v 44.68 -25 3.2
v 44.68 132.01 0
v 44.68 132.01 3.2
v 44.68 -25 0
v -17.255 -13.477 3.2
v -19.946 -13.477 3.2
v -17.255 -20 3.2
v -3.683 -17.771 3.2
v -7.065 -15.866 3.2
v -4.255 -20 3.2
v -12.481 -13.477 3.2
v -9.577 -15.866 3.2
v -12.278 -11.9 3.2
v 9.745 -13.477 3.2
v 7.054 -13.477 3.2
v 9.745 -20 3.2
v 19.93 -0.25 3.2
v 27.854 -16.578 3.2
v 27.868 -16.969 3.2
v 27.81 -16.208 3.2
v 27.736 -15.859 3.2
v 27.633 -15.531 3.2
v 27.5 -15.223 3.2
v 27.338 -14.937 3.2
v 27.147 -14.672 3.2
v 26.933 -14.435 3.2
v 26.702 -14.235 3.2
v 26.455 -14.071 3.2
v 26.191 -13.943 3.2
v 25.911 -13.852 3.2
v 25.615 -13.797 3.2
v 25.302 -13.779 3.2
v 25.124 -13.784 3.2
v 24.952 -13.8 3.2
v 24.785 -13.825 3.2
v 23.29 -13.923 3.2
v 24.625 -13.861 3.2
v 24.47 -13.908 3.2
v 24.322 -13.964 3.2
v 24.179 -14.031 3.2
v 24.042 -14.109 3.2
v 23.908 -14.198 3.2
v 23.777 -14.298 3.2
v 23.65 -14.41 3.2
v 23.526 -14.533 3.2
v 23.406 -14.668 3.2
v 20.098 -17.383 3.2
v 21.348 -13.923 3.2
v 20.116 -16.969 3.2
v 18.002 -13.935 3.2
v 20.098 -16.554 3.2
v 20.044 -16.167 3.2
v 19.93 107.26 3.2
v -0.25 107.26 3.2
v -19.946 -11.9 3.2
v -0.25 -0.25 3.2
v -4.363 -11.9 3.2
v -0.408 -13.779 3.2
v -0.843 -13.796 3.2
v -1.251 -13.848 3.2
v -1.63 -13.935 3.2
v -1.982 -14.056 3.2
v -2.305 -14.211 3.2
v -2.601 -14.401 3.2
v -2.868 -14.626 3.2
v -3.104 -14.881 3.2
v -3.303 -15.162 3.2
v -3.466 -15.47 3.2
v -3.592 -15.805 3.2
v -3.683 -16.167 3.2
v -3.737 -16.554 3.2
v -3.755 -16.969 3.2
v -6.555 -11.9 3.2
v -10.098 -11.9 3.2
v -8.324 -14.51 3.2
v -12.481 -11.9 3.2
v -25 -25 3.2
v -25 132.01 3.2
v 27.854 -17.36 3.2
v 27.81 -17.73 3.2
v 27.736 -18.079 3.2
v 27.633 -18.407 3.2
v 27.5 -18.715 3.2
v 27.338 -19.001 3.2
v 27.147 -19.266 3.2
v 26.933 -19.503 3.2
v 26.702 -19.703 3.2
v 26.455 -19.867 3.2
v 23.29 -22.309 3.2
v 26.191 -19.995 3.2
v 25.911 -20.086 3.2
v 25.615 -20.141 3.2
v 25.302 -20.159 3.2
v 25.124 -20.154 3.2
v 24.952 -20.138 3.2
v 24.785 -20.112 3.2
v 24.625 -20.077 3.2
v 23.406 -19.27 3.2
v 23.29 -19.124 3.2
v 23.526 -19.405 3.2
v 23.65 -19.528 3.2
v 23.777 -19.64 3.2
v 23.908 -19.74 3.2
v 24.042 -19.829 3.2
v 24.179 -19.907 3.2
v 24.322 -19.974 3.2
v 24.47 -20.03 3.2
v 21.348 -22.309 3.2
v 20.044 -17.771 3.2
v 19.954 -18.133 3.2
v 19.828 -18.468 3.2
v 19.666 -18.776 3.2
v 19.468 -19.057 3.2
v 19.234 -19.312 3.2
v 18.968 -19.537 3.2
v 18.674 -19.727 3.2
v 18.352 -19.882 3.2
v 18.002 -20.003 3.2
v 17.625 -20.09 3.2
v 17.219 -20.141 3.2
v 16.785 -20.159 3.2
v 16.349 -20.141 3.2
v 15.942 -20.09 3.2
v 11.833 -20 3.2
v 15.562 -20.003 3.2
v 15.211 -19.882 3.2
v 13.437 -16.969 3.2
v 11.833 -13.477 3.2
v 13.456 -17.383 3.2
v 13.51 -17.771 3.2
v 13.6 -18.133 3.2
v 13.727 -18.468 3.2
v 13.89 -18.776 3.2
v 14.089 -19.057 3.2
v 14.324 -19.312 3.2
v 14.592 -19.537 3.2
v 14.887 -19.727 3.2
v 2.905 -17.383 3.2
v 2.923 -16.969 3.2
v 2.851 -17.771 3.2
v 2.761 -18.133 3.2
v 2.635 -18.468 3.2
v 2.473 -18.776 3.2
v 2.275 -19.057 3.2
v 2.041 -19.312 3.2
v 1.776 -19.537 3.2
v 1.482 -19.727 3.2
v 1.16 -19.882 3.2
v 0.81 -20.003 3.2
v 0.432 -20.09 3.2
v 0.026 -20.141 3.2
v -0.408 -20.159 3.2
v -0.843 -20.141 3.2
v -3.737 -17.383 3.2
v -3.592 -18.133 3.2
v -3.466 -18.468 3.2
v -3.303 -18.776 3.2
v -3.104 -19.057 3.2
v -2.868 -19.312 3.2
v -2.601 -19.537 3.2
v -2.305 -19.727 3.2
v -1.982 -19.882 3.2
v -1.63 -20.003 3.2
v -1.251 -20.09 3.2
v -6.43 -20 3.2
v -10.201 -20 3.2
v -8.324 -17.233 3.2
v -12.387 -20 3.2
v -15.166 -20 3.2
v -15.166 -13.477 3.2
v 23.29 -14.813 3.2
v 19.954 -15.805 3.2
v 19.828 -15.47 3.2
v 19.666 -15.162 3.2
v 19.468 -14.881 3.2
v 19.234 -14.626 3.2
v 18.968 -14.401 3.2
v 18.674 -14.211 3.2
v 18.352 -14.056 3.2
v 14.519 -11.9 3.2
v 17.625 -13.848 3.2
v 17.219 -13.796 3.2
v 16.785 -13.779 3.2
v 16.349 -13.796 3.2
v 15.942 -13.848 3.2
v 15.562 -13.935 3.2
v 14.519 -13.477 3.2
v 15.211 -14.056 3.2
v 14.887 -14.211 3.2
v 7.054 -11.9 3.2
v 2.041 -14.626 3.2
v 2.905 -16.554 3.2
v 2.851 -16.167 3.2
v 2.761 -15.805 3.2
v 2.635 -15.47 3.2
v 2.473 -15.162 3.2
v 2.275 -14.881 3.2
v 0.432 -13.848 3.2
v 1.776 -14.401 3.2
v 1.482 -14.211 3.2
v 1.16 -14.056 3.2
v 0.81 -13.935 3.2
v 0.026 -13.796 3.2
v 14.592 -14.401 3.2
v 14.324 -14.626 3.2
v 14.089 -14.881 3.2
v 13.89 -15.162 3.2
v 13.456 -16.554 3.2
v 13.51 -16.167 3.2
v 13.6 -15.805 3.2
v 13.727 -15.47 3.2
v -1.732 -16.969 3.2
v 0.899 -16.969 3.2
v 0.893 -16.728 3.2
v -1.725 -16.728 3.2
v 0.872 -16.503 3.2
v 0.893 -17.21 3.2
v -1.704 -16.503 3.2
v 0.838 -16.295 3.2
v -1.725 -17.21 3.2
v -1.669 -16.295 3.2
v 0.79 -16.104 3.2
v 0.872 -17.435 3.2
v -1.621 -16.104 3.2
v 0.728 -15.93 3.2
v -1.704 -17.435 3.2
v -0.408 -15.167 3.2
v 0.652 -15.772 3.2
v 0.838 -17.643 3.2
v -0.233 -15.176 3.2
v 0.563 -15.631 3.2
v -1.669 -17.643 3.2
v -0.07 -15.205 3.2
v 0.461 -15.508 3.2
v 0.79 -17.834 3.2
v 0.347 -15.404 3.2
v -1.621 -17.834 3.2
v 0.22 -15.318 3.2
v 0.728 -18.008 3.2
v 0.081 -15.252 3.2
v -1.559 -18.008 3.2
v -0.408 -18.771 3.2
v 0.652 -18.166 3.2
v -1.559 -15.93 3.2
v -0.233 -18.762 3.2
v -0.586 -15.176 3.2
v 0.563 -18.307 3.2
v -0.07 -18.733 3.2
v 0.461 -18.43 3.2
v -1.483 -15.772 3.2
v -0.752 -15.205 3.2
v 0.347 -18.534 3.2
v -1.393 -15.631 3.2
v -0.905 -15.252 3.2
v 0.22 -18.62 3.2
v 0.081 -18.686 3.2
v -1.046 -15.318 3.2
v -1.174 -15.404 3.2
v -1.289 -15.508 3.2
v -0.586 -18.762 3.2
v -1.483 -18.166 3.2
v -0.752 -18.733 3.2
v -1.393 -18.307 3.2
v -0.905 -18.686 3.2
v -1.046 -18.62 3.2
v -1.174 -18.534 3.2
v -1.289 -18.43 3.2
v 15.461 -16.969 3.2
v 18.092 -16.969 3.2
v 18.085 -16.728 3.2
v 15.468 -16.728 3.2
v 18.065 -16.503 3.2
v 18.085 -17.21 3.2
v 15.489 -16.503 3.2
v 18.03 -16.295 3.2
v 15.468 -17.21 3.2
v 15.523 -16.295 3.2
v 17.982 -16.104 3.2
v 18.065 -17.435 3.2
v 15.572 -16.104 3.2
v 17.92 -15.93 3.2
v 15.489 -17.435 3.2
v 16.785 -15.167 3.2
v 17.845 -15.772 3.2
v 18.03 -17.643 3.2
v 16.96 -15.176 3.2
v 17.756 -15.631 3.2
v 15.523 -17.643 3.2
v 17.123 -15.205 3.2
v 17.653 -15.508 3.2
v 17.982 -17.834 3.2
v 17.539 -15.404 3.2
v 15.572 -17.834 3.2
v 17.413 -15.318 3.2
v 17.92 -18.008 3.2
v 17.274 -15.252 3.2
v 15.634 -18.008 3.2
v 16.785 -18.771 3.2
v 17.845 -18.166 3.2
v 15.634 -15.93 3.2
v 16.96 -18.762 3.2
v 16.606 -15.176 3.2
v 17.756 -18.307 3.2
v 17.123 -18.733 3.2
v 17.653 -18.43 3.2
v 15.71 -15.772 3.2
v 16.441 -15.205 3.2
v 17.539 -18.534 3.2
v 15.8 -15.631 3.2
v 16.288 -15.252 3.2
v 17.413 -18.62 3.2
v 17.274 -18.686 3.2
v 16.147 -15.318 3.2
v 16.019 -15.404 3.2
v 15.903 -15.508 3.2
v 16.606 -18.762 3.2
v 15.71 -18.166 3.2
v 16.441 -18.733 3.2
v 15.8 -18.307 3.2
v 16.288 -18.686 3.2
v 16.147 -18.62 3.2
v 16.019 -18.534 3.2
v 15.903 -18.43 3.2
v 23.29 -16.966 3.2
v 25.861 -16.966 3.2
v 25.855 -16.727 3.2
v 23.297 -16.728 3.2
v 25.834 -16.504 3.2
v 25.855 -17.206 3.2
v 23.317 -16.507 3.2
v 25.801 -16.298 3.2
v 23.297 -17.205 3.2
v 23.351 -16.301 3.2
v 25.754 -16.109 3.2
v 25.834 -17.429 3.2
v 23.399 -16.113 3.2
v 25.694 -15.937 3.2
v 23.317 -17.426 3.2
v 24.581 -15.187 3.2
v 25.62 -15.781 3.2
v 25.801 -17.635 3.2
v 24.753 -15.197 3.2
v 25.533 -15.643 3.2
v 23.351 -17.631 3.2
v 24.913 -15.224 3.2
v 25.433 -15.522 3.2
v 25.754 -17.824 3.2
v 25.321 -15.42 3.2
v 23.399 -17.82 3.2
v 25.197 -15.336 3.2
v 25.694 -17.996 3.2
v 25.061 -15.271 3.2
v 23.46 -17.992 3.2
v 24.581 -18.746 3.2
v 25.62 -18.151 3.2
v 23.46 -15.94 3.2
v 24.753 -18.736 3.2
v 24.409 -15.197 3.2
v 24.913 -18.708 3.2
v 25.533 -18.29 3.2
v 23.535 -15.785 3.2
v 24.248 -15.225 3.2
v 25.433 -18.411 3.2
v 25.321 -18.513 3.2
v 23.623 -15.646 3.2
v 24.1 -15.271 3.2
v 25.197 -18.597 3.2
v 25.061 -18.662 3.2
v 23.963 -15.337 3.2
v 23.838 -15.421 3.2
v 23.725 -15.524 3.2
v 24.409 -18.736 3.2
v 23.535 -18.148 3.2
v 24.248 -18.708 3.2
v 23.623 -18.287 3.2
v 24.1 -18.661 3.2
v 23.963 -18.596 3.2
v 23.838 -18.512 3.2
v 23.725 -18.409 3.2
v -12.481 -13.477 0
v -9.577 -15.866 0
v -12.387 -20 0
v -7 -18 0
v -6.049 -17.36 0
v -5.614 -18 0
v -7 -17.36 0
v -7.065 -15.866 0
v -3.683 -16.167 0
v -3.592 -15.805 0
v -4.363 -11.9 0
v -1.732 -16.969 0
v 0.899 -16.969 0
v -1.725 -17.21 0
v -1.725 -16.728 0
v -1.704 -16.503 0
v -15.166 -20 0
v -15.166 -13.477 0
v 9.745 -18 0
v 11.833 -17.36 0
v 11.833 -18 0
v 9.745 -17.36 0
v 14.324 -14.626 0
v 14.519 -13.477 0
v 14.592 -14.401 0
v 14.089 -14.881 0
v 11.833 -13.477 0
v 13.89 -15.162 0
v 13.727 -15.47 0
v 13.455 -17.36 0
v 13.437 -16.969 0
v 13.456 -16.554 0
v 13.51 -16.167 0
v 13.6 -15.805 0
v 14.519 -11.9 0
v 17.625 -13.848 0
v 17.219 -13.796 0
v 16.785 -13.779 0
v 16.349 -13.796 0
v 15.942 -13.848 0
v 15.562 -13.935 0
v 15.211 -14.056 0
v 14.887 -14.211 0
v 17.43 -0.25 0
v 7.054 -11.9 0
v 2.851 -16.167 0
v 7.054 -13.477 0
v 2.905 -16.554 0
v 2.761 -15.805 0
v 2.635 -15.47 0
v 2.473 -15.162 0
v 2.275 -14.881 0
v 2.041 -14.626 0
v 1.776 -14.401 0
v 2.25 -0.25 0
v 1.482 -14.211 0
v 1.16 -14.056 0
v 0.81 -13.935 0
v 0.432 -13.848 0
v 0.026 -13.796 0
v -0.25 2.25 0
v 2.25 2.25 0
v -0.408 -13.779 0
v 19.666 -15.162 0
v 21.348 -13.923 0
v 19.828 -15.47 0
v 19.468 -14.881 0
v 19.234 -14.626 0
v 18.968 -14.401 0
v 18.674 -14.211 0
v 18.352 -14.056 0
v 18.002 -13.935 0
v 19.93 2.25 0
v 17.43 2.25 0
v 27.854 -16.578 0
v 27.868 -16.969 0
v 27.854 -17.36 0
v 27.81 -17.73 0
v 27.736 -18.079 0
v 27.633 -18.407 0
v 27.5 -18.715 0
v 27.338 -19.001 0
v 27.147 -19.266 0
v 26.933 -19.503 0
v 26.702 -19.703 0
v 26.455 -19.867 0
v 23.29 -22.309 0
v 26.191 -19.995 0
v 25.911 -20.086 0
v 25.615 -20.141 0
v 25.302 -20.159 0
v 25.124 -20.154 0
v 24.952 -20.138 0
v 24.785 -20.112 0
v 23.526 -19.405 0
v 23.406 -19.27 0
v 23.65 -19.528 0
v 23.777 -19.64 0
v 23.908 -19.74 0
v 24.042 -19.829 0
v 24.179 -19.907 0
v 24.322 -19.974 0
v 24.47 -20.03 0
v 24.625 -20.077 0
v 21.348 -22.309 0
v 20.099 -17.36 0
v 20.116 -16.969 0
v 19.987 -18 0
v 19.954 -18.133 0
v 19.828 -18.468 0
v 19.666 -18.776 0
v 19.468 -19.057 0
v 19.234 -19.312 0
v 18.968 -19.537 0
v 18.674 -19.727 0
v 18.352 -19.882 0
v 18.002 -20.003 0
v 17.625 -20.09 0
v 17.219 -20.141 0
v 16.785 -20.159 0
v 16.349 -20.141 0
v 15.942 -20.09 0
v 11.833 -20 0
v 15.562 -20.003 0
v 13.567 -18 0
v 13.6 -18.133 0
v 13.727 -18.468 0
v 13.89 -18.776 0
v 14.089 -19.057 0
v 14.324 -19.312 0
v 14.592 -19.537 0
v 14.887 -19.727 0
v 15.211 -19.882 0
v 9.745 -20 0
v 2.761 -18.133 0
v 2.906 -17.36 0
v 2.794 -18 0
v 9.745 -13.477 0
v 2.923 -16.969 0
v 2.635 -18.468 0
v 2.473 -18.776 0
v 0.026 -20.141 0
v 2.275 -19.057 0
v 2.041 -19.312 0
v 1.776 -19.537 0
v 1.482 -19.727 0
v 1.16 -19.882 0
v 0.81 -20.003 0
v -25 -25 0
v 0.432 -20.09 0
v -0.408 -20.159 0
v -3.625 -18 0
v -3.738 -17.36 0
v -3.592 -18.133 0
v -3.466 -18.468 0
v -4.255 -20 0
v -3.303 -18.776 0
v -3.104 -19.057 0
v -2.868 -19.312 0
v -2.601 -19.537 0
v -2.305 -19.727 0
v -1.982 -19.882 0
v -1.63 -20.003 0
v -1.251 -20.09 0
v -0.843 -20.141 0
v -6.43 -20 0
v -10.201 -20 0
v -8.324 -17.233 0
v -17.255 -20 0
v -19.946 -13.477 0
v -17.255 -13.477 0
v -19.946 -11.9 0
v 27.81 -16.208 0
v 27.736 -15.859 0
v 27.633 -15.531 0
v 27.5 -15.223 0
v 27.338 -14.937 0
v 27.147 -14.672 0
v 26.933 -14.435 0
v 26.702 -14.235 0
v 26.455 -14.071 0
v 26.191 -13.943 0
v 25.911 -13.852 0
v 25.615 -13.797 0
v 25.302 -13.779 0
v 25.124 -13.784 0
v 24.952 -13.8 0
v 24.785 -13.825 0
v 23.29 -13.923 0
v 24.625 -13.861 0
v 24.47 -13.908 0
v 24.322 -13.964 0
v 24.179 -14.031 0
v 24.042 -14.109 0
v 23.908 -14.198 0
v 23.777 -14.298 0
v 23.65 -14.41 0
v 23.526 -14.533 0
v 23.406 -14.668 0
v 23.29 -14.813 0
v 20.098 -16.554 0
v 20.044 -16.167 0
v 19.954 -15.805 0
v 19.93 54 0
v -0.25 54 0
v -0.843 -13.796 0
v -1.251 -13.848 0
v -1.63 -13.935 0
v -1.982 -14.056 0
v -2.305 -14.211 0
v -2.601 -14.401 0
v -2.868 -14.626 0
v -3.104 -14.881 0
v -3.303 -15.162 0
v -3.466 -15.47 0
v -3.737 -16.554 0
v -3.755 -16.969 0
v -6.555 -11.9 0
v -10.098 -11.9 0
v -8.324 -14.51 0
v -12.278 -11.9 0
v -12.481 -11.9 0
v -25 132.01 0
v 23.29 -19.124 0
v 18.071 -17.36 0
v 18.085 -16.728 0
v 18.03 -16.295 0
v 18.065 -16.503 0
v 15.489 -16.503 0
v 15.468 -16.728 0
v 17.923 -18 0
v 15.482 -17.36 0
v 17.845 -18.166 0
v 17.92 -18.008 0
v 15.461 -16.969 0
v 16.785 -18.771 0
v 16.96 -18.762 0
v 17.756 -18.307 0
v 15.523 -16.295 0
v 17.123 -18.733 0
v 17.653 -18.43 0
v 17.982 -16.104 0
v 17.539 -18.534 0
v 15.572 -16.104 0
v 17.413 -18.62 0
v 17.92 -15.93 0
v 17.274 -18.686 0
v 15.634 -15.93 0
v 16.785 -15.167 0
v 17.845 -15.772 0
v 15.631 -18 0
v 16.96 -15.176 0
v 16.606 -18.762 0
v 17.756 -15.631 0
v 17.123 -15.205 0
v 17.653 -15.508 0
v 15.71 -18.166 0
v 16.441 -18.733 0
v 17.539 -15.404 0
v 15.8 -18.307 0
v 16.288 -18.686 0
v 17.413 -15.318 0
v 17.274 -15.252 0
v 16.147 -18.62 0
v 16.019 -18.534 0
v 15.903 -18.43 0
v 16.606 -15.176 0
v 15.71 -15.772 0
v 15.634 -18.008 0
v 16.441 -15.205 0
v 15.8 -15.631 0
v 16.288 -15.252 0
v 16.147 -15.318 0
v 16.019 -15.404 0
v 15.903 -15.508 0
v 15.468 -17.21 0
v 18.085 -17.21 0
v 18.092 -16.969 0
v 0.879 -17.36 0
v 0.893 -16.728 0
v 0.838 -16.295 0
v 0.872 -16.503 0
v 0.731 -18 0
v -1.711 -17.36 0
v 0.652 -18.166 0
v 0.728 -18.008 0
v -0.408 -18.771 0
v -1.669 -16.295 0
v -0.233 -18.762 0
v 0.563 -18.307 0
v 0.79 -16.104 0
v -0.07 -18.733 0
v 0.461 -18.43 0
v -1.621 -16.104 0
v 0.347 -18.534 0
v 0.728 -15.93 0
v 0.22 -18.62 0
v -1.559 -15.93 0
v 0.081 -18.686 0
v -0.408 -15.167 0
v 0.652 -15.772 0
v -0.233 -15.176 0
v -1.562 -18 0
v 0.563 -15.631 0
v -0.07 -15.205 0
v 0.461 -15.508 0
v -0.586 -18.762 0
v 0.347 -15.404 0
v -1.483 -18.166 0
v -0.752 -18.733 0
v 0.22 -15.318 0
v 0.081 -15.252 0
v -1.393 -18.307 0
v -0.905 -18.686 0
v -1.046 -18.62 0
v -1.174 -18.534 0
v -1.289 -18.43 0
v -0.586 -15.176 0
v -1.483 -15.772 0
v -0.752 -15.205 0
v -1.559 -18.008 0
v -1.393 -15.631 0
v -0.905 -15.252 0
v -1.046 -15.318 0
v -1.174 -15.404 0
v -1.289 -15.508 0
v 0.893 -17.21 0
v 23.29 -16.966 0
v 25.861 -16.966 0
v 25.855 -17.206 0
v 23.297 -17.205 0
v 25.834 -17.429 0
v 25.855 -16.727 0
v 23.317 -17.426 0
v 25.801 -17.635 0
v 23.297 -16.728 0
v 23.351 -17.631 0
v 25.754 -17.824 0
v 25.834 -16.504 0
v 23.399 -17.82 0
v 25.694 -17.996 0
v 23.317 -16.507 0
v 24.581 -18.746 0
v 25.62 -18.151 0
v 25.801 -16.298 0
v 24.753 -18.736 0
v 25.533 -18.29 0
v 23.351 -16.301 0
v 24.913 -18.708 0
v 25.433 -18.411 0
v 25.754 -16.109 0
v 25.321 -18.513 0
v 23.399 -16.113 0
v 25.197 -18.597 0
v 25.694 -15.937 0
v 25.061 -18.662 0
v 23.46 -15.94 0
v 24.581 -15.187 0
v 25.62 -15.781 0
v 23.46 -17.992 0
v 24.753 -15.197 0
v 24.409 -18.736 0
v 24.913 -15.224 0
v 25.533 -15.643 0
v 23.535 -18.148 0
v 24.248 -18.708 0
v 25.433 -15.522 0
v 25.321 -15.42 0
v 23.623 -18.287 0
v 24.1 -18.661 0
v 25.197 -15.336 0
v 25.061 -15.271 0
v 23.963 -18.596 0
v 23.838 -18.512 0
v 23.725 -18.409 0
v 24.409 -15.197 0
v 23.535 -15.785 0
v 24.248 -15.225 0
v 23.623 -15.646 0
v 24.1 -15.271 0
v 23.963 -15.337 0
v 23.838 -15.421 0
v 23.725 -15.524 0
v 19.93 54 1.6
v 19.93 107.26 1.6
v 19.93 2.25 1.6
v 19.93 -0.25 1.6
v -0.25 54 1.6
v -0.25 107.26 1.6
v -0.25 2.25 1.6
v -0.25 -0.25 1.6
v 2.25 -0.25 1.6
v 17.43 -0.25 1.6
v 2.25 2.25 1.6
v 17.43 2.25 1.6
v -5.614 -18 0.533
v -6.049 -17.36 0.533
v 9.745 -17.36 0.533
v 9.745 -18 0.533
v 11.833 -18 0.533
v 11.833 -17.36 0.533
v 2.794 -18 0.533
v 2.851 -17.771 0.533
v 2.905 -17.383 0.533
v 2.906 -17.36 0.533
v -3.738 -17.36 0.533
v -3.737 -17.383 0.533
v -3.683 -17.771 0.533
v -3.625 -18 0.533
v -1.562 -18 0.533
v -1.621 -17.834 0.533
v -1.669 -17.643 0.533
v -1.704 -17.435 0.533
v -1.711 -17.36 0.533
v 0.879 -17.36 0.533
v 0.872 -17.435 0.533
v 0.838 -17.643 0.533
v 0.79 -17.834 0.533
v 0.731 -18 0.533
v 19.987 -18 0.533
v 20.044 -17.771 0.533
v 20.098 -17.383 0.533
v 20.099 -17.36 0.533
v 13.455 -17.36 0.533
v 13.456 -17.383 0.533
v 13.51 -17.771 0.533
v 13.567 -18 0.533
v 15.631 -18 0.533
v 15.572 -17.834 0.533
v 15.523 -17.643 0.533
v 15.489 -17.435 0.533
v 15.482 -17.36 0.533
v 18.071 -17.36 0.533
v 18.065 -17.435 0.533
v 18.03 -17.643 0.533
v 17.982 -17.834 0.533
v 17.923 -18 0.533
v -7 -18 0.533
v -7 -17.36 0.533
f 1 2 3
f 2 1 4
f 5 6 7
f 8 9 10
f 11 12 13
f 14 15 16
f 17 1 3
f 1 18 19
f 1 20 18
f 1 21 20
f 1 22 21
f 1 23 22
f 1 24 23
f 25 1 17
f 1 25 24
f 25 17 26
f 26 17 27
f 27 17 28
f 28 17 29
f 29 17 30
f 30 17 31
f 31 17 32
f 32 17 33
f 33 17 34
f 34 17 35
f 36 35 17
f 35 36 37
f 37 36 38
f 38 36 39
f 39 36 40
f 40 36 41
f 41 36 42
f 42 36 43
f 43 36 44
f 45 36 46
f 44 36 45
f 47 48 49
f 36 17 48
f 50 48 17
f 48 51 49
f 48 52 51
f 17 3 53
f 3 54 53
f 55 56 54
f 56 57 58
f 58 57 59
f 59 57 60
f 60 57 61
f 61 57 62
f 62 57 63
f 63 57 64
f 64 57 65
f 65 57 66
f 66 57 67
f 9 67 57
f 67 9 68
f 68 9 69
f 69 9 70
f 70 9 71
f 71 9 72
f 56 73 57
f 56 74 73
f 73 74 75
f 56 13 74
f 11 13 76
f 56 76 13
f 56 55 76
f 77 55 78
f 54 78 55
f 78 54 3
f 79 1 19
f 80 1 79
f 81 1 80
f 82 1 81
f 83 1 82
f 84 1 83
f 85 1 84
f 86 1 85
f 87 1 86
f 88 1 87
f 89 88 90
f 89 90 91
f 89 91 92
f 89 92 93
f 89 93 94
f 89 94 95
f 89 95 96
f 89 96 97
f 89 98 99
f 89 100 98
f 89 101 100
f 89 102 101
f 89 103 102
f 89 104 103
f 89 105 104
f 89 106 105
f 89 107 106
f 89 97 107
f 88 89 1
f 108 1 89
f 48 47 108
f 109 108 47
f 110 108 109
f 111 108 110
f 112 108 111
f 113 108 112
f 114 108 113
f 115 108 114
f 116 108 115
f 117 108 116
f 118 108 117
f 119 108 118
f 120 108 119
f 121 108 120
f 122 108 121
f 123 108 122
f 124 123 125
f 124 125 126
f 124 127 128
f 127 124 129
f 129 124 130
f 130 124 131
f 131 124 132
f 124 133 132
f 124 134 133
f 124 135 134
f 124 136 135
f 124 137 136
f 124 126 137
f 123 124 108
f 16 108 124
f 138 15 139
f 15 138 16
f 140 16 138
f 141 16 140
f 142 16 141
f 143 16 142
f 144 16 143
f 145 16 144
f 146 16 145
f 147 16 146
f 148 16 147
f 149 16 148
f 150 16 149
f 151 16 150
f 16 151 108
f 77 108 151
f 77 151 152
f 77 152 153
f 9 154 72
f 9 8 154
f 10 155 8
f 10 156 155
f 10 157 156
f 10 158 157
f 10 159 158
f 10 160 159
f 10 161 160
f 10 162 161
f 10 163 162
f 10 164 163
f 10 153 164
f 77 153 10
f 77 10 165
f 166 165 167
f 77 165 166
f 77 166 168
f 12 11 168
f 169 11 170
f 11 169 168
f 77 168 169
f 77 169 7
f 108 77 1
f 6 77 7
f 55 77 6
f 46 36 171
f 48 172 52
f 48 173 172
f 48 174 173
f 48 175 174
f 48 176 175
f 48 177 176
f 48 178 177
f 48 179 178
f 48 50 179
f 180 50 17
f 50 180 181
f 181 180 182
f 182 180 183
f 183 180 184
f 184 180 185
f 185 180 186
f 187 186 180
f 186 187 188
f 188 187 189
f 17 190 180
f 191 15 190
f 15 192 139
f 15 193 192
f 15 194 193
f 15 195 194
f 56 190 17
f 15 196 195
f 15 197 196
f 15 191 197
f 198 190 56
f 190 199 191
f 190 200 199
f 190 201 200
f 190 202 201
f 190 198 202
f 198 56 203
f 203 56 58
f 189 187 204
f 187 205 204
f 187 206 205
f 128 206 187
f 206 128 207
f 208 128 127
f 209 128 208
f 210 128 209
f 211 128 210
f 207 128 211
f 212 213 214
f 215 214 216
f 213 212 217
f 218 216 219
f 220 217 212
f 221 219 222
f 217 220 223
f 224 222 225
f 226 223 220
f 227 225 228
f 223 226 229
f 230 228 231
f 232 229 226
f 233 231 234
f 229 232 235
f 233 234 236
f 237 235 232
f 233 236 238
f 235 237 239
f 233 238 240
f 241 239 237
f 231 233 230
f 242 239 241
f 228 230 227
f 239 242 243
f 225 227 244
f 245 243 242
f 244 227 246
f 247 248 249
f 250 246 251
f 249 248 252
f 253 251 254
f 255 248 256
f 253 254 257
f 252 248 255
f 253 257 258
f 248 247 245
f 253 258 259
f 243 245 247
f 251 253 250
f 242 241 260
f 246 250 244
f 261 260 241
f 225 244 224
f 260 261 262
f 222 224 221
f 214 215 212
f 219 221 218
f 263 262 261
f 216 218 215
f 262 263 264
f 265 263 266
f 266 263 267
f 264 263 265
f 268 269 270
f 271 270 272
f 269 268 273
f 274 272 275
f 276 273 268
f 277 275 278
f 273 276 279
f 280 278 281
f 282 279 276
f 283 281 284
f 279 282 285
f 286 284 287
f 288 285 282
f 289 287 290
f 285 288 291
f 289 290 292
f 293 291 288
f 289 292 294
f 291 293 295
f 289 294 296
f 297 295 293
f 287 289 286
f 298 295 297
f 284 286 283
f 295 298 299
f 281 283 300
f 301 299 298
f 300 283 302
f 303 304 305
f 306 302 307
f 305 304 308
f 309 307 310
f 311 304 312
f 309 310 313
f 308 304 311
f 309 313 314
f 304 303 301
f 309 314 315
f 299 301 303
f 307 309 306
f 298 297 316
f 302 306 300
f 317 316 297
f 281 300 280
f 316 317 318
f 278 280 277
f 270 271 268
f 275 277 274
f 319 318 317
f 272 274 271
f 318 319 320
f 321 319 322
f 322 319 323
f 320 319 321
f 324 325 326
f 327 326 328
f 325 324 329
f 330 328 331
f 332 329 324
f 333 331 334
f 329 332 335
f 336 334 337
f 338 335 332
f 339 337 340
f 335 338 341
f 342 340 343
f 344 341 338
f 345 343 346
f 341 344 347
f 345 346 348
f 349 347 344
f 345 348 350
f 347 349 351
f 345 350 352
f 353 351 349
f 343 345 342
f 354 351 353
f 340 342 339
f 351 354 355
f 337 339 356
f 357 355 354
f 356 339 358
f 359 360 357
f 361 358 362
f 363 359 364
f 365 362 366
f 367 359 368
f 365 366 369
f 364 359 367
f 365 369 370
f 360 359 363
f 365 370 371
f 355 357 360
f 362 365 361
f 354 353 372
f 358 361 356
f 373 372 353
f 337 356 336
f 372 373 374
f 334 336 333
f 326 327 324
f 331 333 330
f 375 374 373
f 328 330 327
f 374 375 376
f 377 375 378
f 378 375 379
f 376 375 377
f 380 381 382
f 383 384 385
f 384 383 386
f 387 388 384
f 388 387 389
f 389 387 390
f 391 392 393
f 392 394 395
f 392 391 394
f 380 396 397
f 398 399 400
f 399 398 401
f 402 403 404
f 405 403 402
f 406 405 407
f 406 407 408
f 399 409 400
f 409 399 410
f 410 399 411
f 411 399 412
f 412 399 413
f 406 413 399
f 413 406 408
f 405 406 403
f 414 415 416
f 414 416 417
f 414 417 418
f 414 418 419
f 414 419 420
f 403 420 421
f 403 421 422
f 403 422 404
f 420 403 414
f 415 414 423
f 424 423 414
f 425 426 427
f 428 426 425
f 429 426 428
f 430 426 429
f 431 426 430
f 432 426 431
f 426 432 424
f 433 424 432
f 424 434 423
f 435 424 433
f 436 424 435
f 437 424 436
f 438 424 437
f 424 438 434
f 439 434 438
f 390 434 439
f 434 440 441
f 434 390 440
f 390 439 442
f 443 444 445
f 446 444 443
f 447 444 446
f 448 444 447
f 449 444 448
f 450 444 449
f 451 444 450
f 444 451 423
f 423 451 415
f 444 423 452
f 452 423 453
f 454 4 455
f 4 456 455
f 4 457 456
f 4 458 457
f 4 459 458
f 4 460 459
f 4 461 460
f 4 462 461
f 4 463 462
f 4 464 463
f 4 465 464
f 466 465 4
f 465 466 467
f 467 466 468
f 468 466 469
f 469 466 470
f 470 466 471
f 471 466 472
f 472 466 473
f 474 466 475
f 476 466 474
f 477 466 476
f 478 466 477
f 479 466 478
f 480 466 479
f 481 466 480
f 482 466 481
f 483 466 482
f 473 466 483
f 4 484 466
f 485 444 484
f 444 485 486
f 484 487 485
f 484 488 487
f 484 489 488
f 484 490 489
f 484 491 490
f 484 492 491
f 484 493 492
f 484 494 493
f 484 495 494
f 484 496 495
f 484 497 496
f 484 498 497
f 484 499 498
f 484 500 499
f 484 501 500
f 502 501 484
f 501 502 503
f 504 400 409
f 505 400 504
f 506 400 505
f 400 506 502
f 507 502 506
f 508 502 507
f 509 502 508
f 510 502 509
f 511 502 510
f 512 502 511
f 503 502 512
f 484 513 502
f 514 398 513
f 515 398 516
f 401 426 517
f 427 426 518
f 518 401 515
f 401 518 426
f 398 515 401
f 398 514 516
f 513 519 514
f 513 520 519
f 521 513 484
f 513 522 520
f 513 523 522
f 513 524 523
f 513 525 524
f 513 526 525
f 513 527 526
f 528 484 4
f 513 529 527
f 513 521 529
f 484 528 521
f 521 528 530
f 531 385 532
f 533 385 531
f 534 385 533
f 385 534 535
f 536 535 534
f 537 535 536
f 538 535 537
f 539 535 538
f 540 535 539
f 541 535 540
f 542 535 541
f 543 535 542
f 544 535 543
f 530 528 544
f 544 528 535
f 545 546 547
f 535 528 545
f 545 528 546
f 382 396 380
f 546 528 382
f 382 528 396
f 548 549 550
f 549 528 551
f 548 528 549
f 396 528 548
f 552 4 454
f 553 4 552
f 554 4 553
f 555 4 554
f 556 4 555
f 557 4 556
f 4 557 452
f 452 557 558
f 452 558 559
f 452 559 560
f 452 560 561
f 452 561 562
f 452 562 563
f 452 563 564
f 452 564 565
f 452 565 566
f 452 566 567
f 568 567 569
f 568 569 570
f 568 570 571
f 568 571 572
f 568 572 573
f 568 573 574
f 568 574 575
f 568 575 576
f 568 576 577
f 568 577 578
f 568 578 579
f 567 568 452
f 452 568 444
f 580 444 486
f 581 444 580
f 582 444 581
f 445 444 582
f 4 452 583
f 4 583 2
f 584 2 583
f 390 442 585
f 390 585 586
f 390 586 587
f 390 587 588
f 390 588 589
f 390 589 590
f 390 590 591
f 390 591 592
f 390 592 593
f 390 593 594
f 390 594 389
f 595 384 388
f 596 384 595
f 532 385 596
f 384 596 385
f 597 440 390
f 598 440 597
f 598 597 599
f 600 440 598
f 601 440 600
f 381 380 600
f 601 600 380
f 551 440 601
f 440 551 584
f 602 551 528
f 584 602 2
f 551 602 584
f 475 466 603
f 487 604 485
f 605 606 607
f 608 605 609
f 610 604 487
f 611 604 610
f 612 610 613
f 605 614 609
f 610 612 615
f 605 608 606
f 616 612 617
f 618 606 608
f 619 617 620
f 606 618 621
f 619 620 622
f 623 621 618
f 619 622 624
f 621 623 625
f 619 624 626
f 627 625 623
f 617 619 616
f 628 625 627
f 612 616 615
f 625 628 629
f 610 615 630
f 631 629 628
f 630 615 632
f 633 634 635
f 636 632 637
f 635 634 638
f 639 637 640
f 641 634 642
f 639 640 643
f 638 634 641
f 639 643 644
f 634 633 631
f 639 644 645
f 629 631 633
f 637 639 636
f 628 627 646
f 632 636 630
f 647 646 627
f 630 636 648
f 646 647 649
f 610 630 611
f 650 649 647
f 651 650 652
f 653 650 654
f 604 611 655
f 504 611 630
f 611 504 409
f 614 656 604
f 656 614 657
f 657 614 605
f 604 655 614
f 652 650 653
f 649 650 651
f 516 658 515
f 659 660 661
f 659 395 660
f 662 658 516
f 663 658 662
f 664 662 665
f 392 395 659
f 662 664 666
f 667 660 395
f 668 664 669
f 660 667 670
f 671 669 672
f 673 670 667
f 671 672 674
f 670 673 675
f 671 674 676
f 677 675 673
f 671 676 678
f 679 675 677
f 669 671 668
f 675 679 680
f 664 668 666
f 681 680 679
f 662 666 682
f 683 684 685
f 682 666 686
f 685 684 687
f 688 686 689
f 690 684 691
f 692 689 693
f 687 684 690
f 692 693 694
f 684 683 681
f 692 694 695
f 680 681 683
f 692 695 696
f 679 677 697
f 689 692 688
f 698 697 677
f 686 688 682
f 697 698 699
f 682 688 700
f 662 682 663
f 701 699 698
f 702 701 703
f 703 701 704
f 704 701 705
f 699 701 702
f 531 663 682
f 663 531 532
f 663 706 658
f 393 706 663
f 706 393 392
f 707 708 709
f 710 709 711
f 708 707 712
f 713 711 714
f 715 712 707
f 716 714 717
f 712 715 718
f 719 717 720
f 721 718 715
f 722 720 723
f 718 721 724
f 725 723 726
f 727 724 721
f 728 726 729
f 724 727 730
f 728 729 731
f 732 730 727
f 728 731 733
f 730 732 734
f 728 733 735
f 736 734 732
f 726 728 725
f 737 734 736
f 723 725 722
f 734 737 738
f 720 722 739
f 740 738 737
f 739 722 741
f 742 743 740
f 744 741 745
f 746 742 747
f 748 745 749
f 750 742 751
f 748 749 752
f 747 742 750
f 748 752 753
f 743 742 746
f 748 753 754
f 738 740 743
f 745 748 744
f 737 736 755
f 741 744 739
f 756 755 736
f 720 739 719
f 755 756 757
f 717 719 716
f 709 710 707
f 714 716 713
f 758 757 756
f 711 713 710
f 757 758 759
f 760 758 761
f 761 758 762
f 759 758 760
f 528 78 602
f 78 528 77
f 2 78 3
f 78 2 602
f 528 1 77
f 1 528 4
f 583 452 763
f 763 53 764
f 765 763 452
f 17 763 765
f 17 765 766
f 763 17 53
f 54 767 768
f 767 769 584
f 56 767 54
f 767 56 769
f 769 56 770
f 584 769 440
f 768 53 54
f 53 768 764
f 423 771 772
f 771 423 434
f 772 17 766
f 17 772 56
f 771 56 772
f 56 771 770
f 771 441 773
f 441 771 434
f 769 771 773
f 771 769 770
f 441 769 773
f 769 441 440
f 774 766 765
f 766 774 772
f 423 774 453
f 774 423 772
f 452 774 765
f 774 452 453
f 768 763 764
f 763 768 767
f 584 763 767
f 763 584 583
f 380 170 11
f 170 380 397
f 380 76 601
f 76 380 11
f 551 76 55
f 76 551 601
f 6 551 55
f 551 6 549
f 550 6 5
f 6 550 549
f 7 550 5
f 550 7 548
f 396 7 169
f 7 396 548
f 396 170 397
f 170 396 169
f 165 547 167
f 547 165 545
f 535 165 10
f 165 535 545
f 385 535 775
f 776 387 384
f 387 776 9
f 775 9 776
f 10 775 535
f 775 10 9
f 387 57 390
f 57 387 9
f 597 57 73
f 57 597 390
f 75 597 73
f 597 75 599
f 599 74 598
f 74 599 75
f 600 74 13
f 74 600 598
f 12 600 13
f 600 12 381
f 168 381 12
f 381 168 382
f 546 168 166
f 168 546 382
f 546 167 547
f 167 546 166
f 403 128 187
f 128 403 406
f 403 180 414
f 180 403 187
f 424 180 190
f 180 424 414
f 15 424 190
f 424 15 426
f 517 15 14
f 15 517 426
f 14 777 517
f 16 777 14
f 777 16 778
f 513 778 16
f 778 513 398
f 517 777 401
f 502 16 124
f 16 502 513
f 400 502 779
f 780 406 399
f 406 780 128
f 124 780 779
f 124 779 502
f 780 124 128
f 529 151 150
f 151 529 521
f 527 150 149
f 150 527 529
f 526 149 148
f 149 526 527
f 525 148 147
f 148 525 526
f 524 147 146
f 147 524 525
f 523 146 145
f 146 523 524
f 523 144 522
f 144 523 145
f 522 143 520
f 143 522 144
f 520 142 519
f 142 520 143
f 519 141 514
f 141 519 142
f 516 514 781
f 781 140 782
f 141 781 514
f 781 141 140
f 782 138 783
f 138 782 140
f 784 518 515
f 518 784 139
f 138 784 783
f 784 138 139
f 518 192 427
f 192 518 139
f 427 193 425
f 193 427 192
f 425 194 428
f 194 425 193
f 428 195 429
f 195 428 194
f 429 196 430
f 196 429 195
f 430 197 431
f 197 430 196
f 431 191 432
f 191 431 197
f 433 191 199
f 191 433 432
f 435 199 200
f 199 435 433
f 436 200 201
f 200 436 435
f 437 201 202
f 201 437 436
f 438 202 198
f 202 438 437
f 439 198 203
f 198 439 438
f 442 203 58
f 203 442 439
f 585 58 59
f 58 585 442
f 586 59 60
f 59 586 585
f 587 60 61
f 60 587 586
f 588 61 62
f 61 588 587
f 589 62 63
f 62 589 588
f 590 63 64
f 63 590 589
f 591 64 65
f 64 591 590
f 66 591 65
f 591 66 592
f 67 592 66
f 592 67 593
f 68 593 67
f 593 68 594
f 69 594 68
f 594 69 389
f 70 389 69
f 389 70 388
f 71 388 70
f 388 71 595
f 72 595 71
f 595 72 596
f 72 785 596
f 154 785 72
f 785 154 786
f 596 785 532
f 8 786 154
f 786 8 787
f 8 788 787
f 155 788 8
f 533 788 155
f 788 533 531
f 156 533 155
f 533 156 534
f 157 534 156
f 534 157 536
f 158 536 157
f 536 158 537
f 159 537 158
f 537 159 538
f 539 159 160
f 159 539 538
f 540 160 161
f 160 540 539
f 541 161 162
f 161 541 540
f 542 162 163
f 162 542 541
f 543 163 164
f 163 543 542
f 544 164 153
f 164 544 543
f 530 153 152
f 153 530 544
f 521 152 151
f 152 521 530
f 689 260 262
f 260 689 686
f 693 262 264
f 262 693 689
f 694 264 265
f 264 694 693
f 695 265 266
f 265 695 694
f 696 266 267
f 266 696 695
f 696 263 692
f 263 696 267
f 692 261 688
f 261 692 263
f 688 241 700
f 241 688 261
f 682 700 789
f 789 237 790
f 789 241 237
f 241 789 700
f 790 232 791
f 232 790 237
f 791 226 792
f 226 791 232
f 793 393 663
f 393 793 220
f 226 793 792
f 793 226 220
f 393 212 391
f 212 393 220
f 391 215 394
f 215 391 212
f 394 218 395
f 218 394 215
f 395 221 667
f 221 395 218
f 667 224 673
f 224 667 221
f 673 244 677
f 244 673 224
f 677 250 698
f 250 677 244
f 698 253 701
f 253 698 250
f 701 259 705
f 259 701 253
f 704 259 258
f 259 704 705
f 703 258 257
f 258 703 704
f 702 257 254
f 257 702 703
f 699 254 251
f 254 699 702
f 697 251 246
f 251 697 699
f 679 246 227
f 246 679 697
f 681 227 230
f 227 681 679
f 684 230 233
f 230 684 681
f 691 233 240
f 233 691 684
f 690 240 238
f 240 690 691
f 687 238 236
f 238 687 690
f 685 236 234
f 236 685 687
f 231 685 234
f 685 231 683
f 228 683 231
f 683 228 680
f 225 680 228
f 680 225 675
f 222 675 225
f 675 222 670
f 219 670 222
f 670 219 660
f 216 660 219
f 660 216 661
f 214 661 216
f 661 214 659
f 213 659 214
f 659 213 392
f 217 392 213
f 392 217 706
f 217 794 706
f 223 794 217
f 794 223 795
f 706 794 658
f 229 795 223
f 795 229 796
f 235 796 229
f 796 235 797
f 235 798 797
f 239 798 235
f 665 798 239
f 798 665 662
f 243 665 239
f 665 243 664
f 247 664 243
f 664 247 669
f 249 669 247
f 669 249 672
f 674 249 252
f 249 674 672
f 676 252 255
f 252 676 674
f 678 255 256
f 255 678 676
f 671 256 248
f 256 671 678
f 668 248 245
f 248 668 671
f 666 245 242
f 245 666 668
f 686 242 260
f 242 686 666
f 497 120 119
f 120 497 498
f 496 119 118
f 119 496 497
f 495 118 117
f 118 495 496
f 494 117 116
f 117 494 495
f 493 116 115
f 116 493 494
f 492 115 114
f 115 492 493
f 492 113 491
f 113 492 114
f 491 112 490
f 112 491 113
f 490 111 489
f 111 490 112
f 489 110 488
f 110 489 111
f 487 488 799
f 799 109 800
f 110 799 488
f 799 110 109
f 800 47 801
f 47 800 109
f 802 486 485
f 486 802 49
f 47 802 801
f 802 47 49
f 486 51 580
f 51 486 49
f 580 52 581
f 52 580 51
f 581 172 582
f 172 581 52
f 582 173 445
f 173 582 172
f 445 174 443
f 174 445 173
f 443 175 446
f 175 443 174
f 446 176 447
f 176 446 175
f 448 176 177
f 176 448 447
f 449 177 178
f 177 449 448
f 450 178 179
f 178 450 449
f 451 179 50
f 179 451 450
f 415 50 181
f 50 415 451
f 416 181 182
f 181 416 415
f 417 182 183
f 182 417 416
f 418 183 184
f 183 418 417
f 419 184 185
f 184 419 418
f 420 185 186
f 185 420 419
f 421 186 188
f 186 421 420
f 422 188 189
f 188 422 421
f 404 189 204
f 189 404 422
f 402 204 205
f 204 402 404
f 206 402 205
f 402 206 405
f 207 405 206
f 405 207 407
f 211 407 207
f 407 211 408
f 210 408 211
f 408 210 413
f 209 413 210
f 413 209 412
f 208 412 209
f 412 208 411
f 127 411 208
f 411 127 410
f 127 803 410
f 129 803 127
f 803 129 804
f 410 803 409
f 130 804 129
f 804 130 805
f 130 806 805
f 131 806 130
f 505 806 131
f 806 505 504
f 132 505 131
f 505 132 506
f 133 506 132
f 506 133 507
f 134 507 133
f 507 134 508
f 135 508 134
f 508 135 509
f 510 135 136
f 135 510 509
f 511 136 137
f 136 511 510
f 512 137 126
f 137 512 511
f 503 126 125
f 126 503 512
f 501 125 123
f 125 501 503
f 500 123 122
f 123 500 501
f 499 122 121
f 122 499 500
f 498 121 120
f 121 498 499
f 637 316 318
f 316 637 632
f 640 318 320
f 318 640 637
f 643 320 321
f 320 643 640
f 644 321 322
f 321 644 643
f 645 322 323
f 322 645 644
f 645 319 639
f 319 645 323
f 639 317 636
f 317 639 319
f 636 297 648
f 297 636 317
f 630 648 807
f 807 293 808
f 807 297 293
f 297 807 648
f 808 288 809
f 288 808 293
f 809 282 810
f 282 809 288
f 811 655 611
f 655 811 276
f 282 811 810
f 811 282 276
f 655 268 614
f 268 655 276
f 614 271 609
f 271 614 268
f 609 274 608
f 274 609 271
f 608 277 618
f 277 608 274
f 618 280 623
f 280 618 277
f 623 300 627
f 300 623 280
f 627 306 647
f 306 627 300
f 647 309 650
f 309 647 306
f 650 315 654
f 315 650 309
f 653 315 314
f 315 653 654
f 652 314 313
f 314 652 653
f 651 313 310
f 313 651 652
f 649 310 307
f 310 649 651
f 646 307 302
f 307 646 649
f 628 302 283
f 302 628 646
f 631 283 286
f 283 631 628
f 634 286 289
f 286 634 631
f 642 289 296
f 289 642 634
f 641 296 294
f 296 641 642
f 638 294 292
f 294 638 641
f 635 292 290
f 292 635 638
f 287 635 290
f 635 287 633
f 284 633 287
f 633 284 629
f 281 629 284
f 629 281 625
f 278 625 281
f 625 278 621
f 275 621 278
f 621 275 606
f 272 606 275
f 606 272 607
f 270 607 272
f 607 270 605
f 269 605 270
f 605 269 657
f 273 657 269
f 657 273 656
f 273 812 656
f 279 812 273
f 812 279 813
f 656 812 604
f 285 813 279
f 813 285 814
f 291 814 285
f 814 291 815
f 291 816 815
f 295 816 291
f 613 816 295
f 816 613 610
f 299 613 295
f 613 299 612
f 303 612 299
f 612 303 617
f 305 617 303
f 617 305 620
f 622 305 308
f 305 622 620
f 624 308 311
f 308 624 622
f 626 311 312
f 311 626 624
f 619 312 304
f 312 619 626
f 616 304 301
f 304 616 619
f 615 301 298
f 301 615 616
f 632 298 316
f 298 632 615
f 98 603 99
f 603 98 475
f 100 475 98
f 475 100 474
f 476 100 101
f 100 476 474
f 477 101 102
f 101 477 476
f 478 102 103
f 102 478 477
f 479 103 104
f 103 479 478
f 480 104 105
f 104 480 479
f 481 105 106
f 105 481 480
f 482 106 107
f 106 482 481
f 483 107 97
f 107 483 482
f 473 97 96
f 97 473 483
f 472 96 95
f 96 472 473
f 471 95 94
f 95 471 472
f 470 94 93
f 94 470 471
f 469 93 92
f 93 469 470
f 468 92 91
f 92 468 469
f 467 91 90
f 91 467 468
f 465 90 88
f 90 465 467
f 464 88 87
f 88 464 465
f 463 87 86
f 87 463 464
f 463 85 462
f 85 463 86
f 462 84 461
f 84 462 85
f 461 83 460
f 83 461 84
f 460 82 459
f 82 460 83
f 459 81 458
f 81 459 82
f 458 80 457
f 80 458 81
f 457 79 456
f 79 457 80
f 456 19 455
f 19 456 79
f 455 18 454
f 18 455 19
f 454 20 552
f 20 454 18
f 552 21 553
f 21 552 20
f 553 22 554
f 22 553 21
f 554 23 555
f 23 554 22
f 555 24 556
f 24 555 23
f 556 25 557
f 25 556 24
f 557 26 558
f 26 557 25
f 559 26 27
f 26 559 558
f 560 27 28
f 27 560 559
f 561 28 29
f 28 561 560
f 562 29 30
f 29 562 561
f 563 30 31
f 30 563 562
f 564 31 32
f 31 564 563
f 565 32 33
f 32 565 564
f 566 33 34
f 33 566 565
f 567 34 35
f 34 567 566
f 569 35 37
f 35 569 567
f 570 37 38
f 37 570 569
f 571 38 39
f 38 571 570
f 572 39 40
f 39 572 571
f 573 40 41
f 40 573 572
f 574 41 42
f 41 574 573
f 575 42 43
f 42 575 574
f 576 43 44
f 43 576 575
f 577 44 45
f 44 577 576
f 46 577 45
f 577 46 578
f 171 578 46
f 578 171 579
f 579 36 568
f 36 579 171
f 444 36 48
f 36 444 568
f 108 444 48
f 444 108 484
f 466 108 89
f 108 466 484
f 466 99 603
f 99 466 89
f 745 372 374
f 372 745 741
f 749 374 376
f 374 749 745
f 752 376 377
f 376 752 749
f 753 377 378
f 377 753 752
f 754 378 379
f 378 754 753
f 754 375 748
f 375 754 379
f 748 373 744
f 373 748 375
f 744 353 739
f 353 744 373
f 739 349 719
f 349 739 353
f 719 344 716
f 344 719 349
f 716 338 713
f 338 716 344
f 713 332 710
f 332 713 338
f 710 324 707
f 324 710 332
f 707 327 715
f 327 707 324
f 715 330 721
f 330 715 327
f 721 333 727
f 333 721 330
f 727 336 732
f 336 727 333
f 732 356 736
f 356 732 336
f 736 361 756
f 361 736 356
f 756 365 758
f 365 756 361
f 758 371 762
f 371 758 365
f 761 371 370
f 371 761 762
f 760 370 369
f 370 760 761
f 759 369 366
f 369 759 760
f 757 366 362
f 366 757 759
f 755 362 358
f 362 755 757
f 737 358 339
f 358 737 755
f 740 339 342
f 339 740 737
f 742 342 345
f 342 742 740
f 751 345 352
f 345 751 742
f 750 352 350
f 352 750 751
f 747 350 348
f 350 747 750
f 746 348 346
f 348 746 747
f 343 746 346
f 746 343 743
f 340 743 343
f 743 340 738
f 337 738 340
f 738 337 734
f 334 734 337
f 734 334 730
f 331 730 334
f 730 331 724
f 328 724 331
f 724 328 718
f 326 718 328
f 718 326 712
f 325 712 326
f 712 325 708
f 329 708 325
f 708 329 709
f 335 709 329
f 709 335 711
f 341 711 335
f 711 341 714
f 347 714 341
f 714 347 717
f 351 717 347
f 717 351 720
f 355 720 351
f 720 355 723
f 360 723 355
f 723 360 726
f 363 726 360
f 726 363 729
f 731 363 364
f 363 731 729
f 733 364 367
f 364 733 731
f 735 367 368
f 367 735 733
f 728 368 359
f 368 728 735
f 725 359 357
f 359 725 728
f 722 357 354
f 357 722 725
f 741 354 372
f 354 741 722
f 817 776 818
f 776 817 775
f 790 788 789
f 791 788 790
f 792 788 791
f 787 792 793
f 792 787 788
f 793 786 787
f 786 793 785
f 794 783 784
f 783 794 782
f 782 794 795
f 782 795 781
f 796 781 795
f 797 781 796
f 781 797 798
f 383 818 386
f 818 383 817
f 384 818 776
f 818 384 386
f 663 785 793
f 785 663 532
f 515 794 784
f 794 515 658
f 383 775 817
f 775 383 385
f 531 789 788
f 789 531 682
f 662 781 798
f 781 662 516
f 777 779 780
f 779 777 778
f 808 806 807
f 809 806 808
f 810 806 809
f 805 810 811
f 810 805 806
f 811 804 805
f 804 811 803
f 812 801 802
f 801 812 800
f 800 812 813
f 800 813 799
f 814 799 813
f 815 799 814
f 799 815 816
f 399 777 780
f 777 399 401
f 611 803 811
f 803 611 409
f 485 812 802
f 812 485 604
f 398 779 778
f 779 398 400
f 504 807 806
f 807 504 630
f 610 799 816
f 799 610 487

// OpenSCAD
$fn = 50;

// TXo Top

tolerance = .5;

pcbX = 19.68;
pcbY = 107.01;
pcbZ = 1.6;

frame = 25;

barOneStart = 0;
barOneEnd = 5 + (tolerance / 2);

barTwoStart = 54;
barTwoEnd = 107.01 + tolerance;

corner = 2.5;

difference(){

    union(){
        difference() {
            translate([-frame, - frame, 0])
                cube([pcbX + 2 * frame, pcbY + 2 * frame, 2 * pcbZ]);
            translate([-tolerance/2, -tolerance/2, 0])
                cube([pcbX + tolerance, pcbY + tolerance, 2 * pcbZ]);
        }

/*
        translate([-tolerance/2, barOneStart - (tolerance/2), 0])
            cube([pcbX + tolerance, barOneEnd - barOneStart, pcbZ]);
*/

        translate([-tolerance/2,-tolerance/2,0])
            cube([corner, corner, pcbZ]);

        translate([pcbX - corner + (tolerance / 2), -tolerance/2, 0])
            cube([corner, corner, pcbZ]);
        
        translate([-tolerance/2, barTwoStart, 0])
            cube([pcbX + tolerance, barTwoEnd - barTwoStart, pcbZ]);

    }

     translate([-frame * .8, -frame * .8]) {
       linear_extrude(height = 2 * pcbZ)
        text("TXo Top", font = "Core Humanist Sans:style=Bold", size = 8);
     }
 
 }

translate([-7,-frame * .72,0])
    cube([10, pcbZ * .4, pcbZ / 3]);

translate([8,-frame * .72,0])
    cube([10, pcbZ * .4, pcbZ / 3]);
 
translate([16,-frame * .72,0])
    cube([5, pcbZ * .4, pcbZ / 3]);
